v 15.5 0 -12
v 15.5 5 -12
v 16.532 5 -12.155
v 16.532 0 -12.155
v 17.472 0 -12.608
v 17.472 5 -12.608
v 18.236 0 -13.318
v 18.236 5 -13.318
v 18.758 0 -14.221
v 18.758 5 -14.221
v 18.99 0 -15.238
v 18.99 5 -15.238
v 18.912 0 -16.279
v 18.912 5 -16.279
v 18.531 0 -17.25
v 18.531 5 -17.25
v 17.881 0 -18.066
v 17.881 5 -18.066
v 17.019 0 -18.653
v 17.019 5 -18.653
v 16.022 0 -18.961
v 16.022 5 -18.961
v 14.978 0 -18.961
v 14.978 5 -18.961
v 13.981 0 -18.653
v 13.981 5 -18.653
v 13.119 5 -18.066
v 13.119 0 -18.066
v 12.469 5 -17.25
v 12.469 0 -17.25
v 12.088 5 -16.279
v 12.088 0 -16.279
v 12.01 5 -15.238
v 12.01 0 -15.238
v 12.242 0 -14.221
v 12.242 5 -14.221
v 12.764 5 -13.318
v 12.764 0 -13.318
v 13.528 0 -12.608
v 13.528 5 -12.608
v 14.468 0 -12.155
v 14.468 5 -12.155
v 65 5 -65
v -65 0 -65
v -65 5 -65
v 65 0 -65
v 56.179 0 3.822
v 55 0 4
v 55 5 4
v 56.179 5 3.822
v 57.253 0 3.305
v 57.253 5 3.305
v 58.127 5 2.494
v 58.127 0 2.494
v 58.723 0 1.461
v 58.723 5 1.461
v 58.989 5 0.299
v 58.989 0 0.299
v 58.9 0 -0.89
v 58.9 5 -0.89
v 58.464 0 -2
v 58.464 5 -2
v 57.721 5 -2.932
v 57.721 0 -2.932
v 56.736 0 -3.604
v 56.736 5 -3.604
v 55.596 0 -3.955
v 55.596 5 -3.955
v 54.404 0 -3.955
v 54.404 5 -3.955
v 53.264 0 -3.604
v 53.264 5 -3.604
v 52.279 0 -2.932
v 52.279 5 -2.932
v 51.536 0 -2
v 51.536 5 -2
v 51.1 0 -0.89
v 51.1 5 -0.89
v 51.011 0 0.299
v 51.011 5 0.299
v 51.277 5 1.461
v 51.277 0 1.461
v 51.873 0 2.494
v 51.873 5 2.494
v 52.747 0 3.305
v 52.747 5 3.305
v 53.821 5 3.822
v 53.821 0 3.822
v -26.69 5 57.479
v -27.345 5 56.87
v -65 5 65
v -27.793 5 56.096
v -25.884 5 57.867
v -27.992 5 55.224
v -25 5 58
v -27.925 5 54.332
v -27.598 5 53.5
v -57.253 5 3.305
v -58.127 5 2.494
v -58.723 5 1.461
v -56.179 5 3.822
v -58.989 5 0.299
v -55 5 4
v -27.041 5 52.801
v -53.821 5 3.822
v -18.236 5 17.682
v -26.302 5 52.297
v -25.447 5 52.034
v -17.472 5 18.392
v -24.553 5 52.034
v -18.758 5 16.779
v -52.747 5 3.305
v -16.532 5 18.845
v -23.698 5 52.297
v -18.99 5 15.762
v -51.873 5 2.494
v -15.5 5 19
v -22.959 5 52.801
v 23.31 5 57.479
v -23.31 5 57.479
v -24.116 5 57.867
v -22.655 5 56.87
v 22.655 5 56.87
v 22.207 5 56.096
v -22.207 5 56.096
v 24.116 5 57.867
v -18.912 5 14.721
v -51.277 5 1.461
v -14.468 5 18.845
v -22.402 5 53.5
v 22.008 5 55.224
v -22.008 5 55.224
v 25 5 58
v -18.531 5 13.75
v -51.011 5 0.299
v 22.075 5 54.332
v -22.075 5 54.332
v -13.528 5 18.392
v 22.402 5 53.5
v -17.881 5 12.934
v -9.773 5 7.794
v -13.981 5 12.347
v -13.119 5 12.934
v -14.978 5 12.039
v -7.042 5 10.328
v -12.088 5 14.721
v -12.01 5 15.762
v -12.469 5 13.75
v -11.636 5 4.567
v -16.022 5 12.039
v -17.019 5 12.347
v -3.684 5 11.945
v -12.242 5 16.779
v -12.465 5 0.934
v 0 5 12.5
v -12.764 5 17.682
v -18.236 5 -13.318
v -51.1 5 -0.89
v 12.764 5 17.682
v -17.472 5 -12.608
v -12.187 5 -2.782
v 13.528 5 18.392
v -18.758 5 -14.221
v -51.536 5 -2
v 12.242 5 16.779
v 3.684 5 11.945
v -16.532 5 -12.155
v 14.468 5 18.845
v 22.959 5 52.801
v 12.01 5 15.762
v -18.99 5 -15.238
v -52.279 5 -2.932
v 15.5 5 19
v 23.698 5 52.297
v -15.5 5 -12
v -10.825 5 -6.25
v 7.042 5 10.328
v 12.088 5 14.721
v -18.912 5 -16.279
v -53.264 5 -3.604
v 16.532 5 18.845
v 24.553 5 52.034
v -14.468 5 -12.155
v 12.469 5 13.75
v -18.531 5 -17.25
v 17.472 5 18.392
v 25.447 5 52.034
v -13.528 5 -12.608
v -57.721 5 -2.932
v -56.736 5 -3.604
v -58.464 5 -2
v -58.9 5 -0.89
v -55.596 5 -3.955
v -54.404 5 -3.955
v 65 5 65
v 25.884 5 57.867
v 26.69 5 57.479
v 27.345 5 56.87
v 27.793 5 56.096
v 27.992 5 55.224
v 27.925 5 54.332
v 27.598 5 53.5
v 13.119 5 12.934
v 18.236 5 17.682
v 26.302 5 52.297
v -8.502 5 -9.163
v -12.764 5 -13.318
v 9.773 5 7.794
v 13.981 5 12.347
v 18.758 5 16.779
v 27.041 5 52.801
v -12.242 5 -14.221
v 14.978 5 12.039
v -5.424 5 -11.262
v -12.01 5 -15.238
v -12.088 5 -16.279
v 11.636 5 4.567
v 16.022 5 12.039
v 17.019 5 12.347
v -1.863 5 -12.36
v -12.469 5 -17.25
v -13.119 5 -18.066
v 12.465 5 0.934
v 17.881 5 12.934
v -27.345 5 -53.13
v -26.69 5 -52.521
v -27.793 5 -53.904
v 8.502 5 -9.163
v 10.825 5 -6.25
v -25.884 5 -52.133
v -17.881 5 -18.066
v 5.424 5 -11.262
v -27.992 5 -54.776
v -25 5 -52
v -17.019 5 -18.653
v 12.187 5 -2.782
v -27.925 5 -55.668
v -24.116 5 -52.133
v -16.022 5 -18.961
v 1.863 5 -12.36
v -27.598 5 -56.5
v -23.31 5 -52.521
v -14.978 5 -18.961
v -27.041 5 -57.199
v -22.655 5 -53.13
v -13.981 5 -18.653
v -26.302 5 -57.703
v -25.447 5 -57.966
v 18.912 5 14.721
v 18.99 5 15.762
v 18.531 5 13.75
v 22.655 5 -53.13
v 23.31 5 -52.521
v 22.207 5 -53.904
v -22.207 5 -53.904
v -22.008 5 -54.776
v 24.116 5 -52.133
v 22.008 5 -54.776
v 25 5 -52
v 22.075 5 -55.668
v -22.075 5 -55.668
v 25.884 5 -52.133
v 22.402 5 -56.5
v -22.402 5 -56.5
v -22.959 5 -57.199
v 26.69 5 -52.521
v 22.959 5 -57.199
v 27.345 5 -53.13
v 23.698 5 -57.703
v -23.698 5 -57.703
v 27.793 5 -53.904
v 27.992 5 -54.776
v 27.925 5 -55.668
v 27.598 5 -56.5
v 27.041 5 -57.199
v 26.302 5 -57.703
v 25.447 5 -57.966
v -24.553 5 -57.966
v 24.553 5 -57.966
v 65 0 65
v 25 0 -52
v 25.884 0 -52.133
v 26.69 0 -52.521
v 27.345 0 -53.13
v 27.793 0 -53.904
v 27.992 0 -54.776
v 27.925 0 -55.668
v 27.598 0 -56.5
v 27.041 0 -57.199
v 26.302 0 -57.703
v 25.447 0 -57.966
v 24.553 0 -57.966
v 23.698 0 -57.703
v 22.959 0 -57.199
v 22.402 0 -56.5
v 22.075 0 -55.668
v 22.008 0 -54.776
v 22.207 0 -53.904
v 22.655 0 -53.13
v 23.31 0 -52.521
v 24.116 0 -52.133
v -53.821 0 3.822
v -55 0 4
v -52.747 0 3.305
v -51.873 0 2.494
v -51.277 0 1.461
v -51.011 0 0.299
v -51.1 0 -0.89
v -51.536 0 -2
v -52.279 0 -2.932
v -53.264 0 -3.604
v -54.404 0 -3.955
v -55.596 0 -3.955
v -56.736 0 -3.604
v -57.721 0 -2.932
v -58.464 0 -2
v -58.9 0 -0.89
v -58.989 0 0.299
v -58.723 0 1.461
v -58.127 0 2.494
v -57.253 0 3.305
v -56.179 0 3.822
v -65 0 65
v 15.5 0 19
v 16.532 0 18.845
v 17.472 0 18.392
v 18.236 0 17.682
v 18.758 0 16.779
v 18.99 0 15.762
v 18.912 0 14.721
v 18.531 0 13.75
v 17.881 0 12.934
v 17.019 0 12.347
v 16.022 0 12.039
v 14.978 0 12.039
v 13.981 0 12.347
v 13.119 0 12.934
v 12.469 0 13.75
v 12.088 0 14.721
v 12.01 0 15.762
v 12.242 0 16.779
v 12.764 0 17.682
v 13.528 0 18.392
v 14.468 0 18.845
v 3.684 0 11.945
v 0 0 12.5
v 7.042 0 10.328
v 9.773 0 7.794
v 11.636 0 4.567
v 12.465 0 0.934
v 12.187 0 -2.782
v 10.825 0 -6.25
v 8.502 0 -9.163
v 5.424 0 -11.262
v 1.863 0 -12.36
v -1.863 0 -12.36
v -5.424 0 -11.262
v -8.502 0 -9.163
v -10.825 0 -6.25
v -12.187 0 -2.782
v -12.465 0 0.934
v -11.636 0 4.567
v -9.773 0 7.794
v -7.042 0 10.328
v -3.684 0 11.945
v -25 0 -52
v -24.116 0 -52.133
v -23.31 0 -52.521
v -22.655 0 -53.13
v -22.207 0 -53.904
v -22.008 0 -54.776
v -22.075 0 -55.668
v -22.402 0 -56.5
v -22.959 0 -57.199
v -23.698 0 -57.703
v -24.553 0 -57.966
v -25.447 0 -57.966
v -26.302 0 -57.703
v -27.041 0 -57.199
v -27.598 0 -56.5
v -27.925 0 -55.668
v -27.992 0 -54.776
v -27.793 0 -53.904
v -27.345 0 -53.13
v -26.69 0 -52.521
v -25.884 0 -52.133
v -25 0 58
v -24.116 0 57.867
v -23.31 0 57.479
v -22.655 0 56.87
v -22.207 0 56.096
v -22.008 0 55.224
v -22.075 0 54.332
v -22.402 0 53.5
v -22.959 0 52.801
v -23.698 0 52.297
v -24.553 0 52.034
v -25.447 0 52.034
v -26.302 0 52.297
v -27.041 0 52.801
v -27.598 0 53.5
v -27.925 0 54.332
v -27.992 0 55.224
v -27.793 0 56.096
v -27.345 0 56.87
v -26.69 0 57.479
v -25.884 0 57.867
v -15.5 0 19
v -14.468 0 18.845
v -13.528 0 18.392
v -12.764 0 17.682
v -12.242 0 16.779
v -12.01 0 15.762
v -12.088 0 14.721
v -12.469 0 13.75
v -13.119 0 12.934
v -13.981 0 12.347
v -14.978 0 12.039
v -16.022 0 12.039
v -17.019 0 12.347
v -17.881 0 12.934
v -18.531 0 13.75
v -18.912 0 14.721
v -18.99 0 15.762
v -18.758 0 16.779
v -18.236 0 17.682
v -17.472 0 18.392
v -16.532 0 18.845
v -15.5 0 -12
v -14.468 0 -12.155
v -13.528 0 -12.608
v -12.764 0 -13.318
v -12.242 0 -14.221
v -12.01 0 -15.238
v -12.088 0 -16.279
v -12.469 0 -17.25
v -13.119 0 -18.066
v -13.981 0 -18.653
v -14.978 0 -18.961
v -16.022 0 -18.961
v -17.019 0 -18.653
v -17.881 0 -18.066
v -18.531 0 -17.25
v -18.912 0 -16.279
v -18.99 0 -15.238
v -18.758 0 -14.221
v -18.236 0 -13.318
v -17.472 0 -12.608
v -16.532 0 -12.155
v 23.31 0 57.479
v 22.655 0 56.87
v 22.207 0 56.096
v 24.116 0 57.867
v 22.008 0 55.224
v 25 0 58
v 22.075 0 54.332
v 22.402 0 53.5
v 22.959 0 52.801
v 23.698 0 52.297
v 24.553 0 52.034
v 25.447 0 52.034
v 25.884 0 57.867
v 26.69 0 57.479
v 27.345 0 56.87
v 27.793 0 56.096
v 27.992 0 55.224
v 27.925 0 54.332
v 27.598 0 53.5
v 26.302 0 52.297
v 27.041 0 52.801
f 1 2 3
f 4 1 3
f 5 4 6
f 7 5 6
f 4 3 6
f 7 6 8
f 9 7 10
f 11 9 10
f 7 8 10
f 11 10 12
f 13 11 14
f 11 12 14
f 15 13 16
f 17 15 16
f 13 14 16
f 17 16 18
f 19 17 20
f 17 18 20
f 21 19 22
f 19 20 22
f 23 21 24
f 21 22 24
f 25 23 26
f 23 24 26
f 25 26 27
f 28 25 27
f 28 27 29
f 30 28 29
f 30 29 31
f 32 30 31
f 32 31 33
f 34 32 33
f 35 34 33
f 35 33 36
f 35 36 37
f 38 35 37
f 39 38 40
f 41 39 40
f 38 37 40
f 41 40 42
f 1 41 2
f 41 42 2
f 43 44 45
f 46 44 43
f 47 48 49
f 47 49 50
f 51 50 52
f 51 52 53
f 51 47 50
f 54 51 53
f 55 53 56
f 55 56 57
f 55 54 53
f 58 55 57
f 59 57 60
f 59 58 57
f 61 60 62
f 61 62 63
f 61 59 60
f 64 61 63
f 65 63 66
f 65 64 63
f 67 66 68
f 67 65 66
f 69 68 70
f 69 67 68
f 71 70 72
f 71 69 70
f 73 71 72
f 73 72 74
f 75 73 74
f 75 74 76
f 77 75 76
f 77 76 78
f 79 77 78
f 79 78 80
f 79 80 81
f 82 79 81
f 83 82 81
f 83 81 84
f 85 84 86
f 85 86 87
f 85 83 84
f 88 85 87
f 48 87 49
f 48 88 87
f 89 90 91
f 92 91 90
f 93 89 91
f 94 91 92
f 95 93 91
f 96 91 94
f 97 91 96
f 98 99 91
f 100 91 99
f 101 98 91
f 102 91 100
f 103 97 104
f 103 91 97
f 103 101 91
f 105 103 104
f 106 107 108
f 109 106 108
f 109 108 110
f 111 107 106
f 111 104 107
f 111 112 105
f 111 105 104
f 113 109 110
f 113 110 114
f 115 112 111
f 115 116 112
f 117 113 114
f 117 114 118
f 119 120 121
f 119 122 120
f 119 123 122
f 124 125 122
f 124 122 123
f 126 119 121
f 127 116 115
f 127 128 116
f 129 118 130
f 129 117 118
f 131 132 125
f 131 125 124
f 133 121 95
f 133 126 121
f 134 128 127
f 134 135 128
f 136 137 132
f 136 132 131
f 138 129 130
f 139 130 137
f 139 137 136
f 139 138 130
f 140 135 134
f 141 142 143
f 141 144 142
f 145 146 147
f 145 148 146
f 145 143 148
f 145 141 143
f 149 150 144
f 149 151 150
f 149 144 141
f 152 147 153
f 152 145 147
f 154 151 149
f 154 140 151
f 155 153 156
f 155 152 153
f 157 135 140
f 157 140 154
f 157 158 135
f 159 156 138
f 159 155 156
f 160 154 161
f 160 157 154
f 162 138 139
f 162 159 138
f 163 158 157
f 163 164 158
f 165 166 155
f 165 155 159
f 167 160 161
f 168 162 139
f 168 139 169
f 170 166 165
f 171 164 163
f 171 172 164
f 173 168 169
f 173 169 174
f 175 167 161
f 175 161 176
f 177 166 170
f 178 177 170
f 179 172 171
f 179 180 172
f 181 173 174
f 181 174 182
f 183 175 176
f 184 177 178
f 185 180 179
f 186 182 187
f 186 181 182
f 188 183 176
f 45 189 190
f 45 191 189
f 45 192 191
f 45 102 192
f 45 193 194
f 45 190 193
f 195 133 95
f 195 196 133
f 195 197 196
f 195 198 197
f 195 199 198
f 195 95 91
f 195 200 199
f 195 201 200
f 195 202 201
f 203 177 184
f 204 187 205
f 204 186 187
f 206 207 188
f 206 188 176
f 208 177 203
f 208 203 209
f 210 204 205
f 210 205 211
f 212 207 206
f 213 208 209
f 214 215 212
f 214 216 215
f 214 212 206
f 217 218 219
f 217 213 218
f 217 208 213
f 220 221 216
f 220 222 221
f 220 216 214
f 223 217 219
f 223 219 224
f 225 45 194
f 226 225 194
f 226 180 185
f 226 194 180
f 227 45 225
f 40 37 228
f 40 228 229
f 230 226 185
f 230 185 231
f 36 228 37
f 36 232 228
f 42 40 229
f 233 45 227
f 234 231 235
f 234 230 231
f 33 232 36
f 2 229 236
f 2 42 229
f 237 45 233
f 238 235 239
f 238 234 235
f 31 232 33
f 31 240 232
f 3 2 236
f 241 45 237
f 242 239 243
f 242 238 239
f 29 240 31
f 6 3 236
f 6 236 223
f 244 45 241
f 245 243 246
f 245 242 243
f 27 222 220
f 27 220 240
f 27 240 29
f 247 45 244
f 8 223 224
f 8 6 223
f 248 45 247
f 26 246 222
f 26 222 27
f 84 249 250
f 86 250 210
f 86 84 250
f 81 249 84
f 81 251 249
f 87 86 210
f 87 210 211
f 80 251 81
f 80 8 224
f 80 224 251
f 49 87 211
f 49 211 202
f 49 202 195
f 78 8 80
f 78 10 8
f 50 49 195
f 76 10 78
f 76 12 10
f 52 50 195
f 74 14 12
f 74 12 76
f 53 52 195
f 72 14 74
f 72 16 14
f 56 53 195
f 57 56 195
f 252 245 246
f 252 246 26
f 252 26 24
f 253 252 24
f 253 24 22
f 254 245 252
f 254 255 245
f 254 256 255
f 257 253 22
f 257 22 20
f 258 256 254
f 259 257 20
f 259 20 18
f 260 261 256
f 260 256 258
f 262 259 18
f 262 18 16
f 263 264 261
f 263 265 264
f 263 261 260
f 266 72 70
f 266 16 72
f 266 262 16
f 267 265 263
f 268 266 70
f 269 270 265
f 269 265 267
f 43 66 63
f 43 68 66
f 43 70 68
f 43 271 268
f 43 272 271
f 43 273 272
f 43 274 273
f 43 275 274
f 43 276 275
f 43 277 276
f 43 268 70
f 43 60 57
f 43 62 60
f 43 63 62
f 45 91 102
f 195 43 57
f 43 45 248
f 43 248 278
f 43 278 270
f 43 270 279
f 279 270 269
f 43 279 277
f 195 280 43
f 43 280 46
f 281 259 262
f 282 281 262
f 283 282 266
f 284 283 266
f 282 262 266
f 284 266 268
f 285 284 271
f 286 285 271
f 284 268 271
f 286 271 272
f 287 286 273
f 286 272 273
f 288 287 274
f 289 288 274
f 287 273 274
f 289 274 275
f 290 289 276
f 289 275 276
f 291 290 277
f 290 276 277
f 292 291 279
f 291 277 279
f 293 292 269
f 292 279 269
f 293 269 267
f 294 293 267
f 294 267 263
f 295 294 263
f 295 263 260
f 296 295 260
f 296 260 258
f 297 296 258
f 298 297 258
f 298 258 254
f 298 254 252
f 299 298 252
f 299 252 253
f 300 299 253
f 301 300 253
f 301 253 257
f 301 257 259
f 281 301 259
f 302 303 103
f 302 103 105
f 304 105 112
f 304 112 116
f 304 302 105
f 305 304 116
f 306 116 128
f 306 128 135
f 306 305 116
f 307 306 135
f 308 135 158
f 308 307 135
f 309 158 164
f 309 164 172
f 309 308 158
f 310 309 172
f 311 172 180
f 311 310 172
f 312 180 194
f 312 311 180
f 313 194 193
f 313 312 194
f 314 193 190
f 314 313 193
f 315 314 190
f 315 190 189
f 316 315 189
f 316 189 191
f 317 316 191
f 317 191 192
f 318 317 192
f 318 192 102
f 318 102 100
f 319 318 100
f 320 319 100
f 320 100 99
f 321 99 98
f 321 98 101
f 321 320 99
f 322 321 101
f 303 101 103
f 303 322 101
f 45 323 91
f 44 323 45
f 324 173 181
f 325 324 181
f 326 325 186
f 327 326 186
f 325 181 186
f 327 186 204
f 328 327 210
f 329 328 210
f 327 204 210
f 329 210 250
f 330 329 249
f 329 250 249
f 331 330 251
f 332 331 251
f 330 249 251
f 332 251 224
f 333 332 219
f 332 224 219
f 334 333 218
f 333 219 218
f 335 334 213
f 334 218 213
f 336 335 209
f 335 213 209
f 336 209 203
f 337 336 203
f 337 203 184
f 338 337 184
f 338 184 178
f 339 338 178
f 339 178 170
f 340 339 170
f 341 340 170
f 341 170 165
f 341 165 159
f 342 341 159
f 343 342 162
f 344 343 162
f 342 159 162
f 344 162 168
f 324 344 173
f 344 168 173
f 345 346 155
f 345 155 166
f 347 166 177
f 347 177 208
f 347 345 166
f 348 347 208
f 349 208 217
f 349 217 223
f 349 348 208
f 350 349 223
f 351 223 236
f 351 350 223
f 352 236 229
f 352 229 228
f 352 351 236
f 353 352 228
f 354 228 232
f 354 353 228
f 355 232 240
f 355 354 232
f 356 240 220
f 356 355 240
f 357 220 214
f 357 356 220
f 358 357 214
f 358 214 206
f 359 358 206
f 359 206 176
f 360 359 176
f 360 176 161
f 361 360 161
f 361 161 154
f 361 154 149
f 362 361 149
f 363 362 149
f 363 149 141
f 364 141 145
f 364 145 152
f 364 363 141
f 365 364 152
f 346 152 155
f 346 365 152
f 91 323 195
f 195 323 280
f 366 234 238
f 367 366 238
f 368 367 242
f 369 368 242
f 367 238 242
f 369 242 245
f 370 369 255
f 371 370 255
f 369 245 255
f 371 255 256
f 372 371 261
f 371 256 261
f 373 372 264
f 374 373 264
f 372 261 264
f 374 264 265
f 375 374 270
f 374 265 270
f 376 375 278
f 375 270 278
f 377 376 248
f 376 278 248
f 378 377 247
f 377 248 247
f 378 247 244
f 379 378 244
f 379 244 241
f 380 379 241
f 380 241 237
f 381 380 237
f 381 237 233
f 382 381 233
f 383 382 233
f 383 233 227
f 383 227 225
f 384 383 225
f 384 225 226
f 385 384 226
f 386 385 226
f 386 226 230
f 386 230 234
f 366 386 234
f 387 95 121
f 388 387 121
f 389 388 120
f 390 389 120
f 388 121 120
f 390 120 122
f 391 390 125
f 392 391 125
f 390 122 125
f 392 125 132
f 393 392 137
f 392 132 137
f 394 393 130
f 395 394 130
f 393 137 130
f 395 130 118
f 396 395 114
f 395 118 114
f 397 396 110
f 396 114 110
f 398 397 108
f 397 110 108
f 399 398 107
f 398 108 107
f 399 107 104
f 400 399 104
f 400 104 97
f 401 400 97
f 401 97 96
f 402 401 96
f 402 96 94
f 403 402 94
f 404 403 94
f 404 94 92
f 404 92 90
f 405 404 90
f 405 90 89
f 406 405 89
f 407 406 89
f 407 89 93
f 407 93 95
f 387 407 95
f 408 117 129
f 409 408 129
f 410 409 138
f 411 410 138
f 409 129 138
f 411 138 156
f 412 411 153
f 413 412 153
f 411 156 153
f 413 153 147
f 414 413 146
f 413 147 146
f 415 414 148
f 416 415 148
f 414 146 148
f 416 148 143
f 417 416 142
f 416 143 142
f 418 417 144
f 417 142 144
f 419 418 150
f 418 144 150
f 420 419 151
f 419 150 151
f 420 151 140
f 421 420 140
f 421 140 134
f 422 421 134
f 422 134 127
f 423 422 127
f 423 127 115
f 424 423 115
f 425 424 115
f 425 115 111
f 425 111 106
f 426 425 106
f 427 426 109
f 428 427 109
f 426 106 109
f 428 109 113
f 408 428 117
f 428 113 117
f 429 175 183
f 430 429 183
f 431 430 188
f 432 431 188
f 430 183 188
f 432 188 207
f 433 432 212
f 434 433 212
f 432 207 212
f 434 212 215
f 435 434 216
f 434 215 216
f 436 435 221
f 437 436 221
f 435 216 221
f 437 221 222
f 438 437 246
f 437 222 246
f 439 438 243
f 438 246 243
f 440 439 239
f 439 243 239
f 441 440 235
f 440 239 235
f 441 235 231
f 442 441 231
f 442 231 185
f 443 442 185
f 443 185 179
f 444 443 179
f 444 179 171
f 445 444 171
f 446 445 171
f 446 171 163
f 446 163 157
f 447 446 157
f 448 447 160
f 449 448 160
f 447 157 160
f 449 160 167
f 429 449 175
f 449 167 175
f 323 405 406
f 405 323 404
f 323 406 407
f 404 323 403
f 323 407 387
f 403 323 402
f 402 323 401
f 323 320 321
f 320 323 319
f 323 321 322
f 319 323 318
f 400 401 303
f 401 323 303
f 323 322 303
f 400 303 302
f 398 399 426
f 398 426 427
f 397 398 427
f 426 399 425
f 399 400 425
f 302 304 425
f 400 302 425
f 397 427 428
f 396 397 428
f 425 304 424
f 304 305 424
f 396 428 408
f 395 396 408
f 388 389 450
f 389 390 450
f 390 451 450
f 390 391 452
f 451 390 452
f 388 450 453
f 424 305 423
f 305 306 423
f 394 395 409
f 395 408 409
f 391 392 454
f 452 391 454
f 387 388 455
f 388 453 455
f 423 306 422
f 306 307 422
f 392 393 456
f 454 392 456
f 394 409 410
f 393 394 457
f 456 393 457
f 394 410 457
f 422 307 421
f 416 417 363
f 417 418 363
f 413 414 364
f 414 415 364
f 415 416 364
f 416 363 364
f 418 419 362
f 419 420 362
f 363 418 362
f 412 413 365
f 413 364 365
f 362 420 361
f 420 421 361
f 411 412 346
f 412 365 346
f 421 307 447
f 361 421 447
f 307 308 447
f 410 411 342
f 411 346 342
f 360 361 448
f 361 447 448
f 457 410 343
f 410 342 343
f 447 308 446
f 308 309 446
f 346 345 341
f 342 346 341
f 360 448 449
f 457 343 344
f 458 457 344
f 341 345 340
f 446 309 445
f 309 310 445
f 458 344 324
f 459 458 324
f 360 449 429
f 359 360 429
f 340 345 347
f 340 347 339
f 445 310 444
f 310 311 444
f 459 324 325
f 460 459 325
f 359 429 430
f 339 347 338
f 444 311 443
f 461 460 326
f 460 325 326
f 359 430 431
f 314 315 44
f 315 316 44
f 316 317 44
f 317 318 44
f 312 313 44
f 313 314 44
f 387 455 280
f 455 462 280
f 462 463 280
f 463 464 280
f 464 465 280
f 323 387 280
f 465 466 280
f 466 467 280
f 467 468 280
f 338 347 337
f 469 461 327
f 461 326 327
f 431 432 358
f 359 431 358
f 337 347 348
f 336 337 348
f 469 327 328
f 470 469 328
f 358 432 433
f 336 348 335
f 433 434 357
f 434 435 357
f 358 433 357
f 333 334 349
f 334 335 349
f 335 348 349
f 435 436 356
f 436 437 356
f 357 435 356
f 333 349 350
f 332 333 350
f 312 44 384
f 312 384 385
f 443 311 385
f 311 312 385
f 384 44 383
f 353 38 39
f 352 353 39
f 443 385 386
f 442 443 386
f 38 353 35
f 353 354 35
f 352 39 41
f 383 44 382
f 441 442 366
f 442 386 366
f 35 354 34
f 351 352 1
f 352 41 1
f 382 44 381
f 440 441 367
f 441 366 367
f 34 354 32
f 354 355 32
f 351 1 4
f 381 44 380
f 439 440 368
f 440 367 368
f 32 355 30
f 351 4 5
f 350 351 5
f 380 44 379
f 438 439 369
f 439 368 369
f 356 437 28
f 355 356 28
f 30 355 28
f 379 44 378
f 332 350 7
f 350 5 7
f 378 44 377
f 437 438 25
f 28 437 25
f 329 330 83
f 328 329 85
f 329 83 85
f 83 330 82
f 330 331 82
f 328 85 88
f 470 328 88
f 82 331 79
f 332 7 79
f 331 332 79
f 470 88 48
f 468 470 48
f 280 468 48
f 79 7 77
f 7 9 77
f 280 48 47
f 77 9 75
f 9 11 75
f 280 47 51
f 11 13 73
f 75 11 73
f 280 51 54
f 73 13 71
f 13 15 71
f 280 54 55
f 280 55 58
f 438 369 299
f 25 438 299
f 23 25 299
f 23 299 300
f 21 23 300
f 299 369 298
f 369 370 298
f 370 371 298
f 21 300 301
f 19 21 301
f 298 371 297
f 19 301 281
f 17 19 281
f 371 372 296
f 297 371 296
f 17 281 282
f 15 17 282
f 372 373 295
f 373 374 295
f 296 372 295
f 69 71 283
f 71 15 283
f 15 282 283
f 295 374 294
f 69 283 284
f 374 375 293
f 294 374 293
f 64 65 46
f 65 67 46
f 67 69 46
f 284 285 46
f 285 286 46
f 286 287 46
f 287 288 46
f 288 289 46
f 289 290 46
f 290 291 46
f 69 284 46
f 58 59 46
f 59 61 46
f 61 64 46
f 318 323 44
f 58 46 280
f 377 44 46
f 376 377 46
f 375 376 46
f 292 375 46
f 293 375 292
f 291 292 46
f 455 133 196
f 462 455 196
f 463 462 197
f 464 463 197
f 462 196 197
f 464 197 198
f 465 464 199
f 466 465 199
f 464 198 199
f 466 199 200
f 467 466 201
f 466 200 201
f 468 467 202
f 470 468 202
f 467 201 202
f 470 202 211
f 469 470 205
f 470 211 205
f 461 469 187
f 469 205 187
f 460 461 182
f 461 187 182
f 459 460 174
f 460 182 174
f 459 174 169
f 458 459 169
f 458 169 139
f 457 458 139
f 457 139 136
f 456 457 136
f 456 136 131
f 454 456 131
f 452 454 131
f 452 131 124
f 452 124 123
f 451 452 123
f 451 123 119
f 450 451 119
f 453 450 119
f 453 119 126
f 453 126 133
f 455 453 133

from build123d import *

# Parameters (mm, degrees)
SKETCH1_W           = 130
SKETCH1_H           = 130
SKETCH1_R           = 12.5
SKETCH1_R_2         = 4
BOSS_EXTRUDE1_DEPTH = 5
SKETCH2_R           = 3
CUT_EXTRUDE1_DEPTH  = 10
SKETCH3_R           = 3.5
CUT_EXTRUDE2_DEPTH  = 5


with BuildPart() as part:
    # Sketch1 → Boss-Extrude1 (new body)
    with BuildSketch(Plane(origin=(0, 0, 0), x_dir=(1, 0, 0), z_dir=(0, 1, 0))):
        Rectangle(SKETCH1_W, SKETCH1_H)
        with Locations(Location((0, 0, 0), (0, 0, 270))):
            Circle(SKETCH1_R, mode=Mode.SUBTRACT)
        with Locations(Location((-55, 0, 0), (0, 0, 270))):
            Circle(SKETCH1_R_2, mode=Mode.SUBTRACT)
        with Locations(Location((55, 0, 0), (0, 0, 270))):
            Circle(SKETCH1_R_2, mode=Mode.SUBTRACT)
    extrude(amount=BOSS_EXTRUDE1_DEPTH)

    # Sketch2 → Cut-Extrude1 (cut)
    with BuildSketch(Plane(origin=(0, 5, 0), x_dir=(1, 0, 0), z_dir=(0, 1, 0))):
        with Locations(Location((-25, 55, 0), (0, 0, 270))):
            Circle(SKETCH2_R)
        with Locations(Location((25, 55, 0), (0, 0, 270))):
            Circle(SKETCH2_R)
        with Locations(Location((25, -55, 0), (0, 0, 270))):
            Circle(SKETCH2_R)
        with Locations(Location((-25, -55, 0), (0, 0, 270))):
            Circle(SKETCH2_R)
    extrude(amount=-CUT_EXTRUDE1_DEPTH, mode=Mode.SUBTRACT)

    # Sketch3 → Cut-Extrude2 (cut)
    with BuildSketch(Plane(origin=(0, 5, 0), x_dir=(1, 0, 0), z_dir=(0, 1, 0))):
        with Locations(Location((-15.5, 15.5, 0), (0, 0, 270))):
            Circle(SKETCH3_R)
        with Locations(Location((15.5, 15.5, 0), (0, 0, 270))):
            Circle(SKETCH3_R)
        with Locations(Location((-15.5, -15.5, 0), (0, 0, 270))):
            Circle(SKETCH3_R)
        with Locations(Location((15.5, -15.5, 0), (0, 0, 270))):
            Circle(SKETCH3_R)
    extrude(amount=-CUT_EXTRUDE2_DEPTH, mode=Mode.SUBTRACT)


solid = part.part
